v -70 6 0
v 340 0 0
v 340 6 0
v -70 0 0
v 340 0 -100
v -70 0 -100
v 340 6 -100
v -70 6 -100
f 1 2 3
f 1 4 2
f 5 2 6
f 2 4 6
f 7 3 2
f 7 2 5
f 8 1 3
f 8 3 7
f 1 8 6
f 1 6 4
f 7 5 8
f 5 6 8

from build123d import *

# Parameters (mm, degrees)
ESBO_O2_W                = 120
ESBO_O2_H                = 100
RESSALTO_EXTRUS_O1_DEPTH = 6
ESBO_O3_W                = 100
ESBO_O3_H                = 6
RESSALTO_EXTRUS_O3_DEPTH = 70
ESBO_O4_W                = 100
ESBO_O4_H                = 6
RESSALTO_EXTRUS_O4_DEPTH = 120
ESBO_O5_W                = 100
ESBO_O5_H                = 6
RESSALTO_EXTRUS_O5_DEPTH = 100


with BuildPart() as part:
    # Esboço2 → Ressalto-extrusão1 (new body)
    with BuildSketch(Plane(origin=(0, 0, 0), x_dir=(1, 0, 0), z_dir=(0, 1, 0))):
        with Locations((60, 50)):
            Rectangle(ESBO_O2_W, ESBO_O2_H)
    extrude(amount=RESSALTO_EXTRUS_O1_DEPTH)

    # Esboço3 → Ressalto-extrusão3 (add)
    with BuildSketch(Plane.ZY):
        with Locations((-50, 3)):
            Rectangle(ESBO_O3_W, ESBO_O3_H)
    extrude(amount=RESSALTO_EXTRUS_O3_DEPTH)

    # Esboço4 → Ressalto-extrusão4 (add)
    with BuildSketch(Plane(origin=(120, 0, 0), x_dir=(0, 0, -1), z_dir=(1, 0, 0))):
        with Locations((50, 3)):
            Rectangle(ESBO_O4_W, ESBO_O4_H)
    extrude(amount=RESSALTO_EXTRUS_O4_DEPTH)

    # Esboço5 → Ressalto-extrusão5 (add)
    with BuildSketch(Plane(origin=(240, 0, 0), x_dir=(0, 0, -1), z_dir=(1, 0, 0))):
        with Locations((50, 3)):
            Rectangle(ESBO_O5_W, ESBO_O5_H)
    extrude(amount=RESSALTO_EXTRUS_O5_DEPTH)


solid = part.part
